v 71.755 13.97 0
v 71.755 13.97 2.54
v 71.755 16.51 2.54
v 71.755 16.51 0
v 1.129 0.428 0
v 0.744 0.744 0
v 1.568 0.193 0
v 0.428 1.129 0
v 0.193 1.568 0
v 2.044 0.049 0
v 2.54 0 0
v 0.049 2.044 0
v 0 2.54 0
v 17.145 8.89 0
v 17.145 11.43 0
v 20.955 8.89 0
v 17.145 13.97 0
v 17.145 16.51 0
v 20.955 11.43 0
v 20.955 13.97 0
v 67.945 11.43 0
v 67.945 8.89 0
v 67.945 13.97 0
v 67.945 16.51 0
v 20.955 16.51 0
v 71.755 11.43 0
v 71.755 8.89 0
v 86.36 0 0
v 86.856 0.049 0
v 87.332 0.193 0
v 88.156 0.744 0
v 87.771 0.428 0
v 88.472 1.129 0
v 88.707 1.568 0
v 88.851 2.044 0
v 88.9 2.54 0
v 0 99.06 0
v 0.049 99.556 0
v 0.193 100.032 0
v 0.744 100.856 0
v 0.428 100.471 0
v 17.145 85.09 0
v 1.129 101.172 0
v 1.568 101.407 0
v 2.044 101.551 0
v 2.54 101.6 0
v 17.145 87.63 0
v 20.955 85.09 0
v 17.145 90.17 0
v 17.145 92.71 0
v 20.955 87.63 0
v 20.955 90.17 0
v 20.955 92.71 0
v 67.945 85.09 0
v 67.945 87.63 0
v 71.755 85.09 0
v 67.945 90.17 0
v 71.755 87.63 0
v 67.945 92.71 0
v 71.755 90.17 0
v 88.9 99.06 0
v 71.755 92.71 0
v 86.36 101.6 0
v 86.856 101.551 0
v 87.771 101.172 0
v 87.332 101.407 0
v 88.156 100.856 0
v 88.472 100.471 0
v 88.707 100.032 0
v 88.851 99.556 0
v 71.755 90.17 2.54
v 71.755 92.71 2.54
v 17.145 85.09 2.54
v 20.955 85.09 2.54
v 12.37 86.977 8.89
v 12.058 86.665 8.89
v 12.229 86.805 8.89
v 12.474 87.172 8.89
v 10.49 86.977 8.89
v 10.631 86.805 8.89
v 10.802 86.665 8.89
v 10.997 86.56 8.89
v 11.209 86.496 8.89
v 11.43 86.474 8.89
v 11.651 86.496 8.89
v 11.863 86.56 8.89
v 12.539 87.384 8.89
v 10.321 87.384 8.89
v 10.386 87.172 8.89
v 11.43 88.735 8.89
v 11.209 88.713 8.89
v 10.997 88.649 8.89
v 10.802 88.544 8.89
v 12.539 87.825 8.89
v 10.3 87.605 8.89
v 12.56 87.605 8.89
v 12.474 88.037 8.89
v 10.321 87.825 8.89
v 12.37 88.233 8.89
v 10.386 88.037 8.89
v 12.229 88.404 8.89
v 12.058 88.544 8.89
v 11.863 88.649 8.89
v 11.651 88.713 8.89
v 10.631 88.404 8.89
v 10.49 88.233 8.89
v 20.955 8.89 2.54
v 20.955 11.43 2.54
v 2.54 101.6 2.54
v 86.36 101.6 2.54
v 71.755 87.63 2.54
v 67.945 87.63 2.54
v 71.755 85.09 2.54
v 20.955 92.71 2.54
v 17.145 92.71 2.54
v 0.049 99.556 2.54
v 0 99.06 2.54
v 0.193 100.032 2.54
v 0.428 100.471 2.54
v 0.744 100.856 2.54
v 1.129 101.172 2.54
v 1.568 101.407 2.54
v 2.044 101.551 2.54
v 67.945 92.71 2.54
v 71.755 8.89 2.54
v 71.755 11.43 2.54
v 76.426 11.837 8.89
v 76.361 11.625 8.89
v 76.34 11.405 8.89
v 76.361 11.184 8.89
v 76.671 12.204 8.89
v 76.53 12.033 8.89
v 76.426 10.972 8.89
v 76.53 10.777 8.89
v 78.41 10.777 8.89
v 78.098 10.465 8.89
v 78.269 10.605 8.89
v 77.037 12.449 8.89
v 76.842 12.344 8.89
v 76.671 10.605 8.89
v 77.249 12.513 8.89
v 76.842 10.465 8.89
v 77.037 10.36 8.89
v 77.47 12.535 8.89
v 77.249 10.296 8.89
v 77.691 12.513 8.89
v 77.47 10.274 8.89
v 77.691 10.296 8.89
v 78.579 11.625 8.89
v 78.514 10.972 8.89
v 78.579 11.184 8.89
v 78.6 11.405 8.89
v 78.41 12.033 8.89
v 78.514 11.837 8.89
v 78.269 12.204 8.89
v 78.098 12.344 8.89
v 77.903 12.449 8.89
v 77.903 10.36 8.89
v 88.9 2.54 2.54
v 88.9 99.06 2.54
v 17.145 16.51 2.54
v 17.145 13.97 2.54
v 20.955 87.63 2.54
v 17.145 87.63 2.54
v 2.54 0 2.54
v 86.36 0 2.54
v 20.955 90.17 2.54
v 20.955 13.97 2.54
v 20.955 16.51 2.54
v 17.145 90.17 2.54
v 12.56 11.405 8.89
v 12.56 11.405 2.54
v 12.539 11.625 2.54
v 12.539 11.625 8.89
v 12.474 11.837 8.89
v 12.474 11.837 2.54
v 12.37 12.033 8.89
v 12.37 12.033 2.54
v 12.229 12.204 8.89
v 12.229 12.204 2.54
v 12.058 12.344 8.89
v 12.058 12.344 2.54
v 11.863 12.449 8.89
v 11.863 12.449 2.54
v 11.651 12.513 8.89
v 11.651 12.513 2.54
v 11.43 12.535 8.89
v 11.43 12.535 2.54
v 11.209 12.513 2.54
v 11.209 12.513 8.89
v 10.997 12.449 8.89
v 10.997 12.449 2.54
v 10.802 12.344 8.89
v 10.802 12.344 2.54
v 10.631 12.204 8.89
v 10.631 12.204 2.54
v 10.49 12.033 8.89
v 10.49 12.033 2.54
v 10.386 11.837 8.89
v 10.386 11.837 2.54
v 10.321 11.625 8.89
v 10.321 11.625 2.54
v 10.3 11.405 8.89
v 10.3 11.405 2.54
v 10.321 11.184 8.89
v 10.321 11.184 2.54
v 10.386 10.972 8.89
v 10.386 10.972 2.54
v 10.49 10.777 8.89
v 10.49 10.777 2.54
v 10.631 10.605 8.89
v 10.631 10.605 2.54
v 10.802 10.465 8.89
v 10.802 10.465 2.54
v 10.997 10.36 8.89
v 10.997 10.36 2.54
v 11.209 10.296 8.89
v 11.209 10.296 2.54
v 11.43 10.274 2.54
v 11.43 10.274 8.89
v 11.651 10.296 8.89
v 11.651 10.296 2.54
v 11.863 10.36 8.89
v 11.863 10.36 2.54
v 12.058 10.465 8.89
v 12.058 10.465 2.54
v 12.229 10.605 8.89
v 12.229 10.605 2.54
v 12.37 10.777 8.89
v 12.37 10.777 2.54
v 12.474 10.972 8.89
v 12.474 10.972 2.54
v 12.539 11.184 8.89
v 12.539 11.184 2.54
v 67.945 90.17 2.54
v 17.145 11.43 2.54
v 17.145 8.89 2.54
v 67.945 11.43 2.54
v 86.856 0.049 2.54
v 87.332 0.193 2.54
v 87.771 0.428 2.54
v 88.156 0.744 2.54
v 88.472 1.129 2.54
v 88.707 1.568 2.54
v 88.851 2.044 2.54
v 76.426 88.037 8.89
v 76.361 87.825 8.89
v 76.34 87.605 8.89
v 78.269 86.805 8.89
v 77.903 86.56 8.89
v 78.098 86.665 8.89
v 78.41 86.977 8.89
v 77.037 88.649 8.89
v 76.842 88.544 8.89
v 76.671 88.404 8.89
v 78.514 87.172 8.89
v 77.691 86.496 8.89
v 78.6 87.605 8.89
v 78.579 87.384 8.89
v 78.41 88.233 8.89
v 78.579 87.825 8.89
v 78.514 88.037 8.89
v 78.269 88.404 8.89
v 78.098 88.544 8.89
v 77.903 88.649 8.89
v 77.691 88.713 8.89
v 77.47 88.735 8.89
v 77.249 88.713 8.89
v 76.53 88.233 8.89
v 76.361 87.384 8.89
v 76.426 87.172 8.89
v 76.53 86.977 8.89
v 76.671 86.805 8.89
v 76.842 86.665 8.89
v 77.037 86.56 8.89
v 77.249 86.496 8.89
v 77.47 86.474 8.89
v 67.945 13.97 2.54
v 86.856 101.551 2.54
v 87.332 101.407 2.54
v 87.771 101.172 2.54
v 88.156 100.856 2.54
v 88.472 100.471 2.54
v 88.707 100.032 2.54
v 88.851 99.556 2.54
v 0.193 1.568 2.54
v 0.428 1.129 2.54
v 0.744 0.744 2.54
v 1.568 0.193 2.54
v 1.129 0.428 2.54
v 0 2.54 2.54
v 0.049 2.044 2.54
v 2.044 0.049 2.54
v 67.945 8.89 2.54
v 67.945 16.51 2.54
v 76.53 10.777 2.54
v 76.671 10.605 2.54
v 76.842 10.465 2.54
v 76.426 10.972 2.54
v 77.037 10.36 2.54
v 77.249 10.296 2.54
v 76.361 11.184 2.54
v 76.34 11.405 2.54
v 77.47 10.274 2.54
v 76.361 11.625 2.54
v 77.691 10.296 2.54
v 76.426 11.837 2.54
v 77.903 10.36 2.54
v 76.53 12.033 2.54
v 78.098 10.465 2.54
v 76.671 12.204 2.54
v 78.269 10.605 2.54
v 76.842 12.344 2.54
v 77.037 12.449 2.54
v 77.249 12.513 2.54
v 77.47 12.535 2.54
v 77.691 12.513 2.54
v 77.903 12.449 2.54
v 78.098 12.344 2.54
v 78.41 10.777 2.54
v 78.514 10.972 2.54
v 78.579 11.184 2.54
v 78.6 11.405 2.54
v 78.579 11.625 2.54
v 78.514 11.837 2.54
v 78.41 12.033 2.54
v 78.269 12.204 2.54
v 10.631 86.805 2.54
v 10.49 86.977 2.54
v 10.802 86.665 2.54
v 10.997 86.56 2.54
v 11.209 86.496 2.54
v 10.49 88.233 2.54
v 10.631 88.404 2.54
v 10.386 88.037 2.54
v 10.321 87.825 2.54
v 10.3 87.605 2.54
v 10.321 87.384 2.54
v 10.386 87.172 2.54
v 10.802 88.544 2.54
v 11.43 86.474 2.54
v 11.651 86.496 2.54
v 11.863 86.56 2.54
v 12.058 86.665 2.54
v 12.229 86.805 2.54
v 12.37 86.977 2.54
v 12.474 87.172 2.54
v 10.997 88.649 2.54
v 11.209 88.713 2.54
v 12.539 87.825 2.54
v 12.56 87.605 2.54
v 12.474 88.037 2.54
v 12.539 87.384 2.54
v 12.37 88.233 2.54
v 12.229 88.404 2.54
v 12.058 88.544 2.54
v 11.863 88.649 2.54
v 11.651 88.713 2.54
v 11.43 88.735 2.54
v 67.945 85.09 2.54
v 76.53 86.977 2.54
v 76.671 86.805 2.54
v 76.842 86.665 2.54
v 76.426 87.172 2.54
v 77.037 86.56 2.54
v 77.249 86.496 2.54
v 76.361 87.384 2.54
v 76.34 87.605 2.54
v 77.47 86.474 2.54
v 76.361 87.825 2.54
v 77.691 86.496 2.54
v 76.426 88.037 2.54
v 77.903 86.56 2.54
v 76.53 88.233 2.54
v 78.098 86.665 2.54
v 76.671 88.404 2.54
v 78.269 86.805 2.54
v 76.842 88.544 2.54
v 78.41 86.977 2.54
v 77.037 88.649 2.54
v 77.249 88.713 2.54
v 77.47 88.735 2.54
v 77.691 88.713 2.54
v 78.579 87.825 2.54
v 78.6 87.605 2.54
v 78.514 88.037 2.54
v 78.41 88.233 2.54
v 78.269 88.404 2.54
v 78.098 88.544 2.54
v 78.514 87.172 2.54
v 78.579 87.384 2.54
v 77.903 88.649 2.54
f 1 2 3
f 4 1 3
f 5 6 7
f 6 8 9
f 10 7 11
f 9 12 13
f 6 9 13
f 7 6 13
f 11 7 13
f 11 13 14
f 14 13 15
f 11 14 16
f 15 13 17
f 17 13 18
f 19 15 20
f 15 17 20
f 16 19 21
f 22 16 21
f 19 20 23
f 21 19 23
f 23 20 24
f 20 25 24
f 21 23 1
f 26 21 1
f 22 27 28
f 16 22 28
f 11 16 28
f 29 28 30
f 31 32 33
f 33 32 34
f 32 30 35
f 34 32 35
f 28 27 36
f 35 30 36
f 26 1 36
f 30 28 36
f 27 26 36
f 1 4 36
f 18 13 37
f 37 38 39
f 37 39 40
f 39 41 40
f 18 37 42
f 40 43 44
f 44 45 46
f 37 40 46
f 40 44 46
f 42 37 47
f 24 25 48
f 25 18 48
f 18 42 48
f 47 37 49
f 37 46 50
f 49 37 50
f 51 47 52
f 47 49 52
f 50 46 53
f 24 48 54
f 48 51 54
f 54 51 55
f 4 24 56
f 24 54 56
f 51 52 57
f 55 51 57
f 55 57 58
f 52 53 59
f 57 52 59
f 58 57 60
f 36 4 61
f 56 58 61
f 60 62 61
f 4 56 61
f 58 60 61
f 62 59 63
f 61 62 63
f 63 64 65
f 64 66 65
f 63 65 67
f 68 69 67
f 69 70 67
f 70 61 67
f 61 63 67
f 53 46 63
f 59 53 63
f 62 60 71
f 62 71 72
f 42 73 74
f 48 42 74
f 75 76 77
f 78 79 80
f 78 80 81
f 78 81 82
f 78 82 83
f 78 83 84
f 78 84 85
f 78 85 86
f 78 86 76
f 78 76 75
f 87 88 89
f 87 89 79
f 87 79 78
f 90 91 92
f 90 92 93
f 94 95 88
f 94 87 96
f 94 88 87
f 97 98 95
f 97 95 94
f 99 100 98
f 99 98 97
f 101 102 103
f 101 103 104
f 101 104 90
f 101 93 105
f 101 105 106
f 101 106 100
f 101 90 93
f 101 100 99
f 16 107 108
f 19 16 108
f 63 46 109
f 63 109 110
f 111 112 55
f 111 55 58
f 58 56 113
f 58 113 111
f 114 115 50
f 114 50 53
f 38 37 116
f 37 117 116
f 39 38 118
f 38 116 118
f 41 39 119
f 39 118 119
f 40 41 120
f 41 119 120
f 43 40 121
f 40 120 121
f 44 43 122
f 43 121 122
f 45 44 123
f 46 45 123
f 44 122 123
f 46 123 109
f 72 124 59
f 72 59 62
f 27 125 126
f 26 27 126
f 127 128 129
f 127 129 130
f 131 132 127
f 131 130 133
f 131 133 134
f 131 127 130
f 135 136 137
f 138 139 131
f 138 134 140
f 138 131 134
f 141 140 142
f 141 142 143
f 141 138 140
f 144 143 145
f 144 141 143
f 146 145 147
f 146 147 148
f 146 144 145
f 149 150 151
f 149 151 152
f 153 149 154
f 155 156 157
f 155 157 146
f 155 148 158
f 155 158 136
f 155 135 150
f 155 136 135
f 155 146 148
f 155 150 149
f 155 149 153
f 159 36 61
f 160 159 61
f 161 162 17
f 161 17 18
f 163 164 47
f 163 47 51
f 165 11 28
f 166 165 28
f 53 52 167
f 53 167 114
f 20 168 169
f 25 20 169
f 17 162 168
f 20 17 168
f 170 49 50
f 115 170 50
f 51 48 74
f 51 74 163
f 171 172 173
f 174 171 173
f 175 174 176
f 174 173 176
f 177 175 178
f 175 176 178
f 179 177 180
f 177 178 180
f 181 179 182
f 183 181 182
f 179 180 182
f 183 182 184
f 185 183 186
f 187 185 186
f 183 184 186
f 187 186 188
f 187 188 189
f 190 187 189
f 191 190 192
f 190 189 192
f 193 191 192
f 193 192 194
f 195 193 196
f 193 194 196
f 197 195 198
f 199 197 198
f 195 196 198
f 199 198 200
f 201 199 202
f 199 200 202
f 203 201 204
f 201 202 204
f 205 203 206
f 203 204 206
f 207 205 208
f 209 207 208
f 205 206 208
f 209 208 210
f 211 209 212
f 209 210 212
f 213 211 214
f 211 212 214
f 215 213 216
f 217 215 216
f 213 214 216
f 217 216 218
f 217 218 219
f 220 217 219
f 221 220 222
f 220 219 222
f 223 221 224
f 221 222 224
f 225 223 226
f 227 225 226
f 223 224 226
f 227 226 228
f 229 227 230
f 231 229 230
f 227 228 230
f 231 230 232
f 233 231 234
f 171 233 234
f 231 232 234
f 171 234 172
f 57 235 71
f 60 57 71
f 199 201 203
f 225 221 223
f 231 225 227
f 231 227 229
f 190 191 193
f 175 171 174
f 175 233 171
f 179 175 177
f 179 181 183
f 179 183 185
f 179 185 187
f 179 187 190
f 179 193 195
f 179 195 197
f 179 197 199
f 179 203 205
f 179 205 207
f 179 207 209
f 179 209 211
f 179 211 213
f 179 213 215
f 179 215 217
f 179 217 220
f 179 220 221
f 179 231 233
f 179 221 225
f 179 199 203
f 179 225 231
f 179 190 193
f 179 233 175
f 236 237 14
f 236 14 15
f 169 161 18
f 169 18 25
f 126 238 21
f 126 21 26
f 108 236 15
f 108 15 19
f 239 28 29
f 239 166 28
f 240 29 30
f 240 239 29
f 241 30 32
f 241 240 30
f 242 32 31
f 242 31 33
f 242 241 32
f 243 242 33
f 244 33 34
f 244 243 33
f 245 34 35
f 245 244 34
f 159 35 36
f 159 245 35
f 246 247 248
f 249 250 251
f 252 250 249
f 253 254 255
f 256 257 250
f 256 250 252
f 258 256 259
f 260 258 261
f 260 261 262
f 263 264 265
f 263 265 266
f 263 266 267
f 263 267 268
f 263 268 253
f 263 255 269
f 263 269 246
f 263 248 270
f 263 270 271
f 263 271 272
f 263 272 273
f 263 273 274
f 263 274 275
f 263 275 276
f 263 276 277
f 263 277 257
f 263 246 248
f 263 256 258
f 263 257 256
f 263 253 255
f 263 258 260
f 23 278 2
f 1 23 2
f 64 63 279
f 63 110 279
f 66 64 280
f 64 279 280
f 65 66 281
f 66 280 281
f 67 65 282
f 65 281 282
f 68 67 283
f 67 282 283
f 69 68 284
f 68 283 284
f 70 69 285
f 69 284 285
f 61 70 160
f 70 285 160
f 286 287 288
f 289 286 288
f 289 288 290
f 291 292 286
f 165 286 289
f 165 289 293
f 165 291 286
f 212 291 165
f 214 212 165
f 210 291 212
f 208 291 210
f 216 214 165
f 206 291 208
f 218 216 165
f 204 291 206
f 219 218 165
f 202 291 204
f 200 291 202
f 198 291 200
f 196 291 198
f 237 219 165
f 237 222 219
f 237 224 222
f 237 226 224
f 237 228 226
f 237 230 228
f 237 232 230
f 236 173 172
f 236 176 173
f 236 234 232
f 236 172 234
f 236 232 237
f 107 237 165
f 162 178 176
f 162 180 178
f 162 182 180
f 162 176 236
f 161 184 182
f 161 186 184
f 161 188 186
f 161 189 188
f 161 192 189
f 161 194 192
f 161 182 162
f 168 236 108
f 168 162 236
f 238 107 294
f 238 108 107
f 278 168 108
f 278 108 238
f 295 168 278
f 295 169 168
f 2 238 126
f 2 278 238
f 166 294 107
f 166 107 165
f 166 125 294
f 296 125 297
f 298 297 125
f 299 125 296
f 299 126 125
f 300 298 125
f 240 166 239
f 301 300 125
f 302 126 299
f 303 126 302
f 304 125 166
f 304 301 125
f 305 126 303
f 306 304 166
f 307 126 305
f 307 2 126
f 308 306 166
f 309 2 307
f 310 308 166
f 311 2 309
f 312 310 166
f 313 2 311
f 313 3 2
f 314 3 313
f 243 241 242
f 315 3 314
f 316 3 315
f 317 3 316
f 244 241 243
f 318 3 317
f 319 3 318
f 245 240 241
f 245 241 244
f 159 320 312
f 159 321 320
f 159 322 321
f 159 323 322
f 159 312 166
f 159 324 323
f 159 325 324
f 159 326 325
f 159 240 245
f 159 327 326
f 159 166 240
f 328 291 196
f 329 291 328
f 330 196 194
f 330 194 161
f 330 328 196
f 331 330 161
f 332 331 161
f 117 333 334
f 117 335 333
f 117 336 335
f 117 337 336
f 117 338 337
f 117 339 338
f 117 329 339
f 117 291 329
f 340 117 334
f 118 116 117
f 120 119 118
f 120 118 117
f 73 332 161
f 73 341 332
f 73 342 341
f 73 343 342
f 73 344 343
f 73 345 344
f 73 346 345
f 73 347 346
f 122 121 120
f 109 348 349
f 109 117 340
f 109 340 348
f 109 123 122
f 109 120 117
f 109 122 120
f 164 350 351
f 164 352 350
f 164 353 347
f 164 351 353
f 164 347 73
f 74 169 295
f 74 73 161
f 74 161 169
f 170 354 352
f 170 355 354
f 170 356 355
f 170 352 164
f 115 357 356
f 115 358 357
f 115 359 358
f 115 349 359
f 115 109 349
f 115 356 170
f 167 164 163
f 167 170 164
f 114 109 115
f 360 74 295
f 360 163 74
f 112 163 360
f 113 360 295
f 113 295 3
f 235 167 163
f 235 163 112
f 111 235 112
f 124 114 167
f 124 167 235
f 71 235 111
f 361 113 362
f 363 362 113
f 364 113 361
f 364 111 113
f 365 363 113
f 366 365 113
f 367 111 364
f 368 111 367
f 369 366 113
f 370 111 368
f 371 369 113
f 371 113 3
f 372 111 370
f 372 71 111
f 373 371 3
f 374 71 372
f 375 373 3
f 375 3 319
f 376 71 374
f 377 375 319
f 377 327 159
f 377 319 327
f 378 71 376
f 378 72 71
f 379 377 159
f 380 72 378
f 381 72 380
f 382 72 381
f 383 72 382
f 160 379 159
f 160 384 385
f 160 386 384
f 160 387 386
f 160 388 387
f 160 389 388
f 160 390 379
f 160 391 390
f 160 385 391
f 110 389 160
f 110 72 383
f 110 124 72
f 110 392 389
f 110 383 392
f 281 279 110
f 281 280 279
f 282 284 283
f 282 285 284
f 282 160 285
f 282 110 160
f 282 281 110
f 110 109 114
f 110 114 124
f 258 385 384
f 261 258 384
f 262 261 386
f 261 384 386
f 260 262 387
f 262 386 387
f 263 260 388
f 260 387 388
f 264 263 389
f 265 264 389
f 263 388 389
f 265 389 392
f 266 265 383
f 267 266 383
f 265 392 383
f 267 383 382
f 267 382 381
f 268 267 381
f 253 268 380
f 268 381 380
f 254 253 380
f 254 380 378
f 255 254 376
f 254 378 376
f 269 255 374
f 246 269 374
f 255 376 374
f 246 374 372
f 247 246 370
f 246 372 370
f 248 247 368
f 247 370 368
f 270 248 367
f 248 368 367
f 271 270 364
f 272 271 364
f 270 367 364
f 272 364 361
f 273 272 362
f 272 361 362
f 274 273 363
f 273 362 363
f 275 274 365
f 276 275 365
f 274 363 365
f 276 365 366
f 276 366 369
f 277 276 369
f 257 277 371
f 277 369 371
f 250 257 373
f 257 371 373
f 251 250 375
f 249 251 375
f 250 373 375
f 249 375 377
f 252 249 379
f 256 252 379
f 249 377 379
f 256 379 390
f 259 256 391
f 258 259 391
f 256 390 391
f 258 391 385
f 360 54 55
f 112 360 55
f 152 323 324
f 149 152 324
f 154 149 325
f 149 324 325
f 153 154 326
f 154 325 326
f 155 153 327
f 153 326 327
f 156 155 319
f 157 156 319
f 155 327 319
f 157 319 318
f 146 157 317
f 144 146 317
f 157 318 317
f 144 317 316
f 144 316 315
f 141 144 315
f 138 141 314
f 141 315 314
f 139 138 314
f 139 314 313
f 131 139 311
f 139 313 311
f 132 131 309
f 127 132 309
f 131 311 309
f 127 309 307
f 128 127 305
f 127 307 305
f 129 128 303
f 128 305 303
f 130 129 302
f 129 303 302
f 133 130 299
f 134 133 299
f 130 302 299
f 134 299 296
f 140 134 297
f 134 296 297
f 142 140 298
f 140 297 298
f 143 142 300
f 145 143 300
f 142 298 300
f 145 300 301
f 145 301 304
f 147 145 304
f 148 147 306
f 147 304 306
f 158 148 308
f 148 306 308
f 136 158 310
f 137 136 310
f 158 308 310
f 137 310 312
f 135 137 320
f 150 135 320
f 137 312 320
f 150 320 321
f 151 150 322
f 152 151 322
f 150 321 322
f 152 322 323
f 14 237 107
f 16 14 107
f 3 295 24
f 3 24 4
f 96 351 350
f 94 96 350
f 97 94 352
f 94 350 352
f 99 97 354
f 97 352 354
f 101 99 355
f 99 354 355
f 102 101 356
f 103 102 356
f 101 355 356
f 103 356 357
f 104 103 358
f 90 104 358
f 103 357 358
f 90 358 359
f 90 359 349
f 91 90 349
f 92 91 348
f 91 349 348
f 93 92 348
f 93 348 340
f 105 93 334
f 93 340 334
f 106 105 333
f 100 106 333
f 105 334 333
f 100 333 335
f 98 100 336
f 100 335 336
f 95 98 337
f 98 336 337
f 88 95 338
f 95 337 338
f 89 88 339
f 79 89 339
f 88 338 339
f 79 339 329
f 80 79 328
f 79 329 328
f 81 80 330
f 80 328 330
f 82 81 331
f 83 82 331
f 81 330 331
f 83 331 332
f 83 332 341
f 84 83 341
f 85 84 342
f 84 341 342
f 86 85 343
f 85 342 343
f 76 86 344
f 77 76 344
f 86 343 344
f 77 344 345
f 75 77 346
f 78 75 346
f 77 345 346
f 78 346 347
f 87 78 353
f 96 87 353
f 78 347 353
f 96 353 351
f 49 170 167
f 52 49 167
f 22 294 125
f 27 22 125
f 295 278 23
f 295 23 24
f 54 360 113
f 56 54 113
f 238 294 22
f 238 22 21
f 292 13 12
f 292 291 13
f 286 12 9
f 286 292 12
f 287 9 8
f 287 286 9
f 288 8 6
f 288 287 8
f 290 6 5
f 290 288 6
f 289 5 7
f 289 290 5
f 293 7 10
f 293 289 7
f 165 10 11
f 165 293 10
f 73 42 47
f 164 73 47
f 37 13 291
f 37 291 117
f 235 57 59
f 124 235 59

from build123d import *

# Parameters (mm, degrees)
SKETCH1_W           = 88.9
SKETCH1_H           = 101.6
BOSS_EXTRUDE1_DEPTH = 2.54
SKETCH2_R           = 1.1303
BOSS_EXTRUDE2_DEPTH = 6.35
SKETCH3_W           = 3.81
SKETCH3_H           = 2.54
CUT_EXTRUDE1_DEPTH  = 2.54
FILLET1_R           = 2.54


with BuildPart() as part:
    # Sketch1 → Boss-Extrude1 (new body)
    with BuildSketch(Plane.XY):
        with Locations((44.45, 50.8)):
            Rectangle(SKETCH1_W, SKETCH1_H)
    extrude(amount=BOSS_EXTRUDE1_DEPTH)

    # Sketch2 → Boss-Extrude2 (add)
    with BuildSketch(Plane.XY.offset(2.54)):
        with Locations((11.43, 87.6046)):
            Circle(SKETCH2_R)
        with Locations((77.47, 87.6046)):
            Circle(SKETCH2_R)
        with Locations((77.47, 11.4046)):
            Circle(SKETCH2_R)
        with Locations((11.43, 11.4046)):
            Circle(SKETCH2_R)
    extrude(amount=BOSS_EXTRUDE2_DEPTH)

    # Sketch3 → Cut-Extrude1 (cut)
    with BuildSketch(Plane.XY.offset(2.54)):
        with Locations((19.05, 15.24)):
            Rectangle(SKETCH3_W, SKETCH3_H)
        with Locations((69.85, 10.16)):
            Rectangle(SKETCH3_W, SKETCH3_H)
        with Locations((69.85, 15.24)):
            Rectangle(SKETCH3_W, SKETCH3_H)
        with Locations((19.05, 10.16)):
            Rectangle(SKETCH3_W, SKETCH3_H)
        with Locations((19.05, 86.36)):
            Rectangle(SKETCH3_W, SKETCH3_H)
        with Locations((19.05, 91.44)):
            Rectangle(SKETCH3_W, SKETCH3_H)
        with Locations((69.85, 86.36)):
            Rectangle(SKETCH3_W, SKETCH3_H)
        with Locations((69.85, 91.44)):
            Rectangle(SKETCH3_W, SKETCH3_H)
    extrude(amount=-CUT_EXTRUDE1_DEPTH, mode=Mode.SUBTRACT)

    # Fillet1
    fillet1_edges = [part.edges().sort_by_distance(p)[0] for p in [
        (0, 101.6, 1.27),
        (88.9, 101.6, 1.27),
        (88.9, 0, 1.27),
        (0, 0, 1.27),
    ]]
    fillet(fillet1_edges, radius=FILLET1_R)


solid = part.part
